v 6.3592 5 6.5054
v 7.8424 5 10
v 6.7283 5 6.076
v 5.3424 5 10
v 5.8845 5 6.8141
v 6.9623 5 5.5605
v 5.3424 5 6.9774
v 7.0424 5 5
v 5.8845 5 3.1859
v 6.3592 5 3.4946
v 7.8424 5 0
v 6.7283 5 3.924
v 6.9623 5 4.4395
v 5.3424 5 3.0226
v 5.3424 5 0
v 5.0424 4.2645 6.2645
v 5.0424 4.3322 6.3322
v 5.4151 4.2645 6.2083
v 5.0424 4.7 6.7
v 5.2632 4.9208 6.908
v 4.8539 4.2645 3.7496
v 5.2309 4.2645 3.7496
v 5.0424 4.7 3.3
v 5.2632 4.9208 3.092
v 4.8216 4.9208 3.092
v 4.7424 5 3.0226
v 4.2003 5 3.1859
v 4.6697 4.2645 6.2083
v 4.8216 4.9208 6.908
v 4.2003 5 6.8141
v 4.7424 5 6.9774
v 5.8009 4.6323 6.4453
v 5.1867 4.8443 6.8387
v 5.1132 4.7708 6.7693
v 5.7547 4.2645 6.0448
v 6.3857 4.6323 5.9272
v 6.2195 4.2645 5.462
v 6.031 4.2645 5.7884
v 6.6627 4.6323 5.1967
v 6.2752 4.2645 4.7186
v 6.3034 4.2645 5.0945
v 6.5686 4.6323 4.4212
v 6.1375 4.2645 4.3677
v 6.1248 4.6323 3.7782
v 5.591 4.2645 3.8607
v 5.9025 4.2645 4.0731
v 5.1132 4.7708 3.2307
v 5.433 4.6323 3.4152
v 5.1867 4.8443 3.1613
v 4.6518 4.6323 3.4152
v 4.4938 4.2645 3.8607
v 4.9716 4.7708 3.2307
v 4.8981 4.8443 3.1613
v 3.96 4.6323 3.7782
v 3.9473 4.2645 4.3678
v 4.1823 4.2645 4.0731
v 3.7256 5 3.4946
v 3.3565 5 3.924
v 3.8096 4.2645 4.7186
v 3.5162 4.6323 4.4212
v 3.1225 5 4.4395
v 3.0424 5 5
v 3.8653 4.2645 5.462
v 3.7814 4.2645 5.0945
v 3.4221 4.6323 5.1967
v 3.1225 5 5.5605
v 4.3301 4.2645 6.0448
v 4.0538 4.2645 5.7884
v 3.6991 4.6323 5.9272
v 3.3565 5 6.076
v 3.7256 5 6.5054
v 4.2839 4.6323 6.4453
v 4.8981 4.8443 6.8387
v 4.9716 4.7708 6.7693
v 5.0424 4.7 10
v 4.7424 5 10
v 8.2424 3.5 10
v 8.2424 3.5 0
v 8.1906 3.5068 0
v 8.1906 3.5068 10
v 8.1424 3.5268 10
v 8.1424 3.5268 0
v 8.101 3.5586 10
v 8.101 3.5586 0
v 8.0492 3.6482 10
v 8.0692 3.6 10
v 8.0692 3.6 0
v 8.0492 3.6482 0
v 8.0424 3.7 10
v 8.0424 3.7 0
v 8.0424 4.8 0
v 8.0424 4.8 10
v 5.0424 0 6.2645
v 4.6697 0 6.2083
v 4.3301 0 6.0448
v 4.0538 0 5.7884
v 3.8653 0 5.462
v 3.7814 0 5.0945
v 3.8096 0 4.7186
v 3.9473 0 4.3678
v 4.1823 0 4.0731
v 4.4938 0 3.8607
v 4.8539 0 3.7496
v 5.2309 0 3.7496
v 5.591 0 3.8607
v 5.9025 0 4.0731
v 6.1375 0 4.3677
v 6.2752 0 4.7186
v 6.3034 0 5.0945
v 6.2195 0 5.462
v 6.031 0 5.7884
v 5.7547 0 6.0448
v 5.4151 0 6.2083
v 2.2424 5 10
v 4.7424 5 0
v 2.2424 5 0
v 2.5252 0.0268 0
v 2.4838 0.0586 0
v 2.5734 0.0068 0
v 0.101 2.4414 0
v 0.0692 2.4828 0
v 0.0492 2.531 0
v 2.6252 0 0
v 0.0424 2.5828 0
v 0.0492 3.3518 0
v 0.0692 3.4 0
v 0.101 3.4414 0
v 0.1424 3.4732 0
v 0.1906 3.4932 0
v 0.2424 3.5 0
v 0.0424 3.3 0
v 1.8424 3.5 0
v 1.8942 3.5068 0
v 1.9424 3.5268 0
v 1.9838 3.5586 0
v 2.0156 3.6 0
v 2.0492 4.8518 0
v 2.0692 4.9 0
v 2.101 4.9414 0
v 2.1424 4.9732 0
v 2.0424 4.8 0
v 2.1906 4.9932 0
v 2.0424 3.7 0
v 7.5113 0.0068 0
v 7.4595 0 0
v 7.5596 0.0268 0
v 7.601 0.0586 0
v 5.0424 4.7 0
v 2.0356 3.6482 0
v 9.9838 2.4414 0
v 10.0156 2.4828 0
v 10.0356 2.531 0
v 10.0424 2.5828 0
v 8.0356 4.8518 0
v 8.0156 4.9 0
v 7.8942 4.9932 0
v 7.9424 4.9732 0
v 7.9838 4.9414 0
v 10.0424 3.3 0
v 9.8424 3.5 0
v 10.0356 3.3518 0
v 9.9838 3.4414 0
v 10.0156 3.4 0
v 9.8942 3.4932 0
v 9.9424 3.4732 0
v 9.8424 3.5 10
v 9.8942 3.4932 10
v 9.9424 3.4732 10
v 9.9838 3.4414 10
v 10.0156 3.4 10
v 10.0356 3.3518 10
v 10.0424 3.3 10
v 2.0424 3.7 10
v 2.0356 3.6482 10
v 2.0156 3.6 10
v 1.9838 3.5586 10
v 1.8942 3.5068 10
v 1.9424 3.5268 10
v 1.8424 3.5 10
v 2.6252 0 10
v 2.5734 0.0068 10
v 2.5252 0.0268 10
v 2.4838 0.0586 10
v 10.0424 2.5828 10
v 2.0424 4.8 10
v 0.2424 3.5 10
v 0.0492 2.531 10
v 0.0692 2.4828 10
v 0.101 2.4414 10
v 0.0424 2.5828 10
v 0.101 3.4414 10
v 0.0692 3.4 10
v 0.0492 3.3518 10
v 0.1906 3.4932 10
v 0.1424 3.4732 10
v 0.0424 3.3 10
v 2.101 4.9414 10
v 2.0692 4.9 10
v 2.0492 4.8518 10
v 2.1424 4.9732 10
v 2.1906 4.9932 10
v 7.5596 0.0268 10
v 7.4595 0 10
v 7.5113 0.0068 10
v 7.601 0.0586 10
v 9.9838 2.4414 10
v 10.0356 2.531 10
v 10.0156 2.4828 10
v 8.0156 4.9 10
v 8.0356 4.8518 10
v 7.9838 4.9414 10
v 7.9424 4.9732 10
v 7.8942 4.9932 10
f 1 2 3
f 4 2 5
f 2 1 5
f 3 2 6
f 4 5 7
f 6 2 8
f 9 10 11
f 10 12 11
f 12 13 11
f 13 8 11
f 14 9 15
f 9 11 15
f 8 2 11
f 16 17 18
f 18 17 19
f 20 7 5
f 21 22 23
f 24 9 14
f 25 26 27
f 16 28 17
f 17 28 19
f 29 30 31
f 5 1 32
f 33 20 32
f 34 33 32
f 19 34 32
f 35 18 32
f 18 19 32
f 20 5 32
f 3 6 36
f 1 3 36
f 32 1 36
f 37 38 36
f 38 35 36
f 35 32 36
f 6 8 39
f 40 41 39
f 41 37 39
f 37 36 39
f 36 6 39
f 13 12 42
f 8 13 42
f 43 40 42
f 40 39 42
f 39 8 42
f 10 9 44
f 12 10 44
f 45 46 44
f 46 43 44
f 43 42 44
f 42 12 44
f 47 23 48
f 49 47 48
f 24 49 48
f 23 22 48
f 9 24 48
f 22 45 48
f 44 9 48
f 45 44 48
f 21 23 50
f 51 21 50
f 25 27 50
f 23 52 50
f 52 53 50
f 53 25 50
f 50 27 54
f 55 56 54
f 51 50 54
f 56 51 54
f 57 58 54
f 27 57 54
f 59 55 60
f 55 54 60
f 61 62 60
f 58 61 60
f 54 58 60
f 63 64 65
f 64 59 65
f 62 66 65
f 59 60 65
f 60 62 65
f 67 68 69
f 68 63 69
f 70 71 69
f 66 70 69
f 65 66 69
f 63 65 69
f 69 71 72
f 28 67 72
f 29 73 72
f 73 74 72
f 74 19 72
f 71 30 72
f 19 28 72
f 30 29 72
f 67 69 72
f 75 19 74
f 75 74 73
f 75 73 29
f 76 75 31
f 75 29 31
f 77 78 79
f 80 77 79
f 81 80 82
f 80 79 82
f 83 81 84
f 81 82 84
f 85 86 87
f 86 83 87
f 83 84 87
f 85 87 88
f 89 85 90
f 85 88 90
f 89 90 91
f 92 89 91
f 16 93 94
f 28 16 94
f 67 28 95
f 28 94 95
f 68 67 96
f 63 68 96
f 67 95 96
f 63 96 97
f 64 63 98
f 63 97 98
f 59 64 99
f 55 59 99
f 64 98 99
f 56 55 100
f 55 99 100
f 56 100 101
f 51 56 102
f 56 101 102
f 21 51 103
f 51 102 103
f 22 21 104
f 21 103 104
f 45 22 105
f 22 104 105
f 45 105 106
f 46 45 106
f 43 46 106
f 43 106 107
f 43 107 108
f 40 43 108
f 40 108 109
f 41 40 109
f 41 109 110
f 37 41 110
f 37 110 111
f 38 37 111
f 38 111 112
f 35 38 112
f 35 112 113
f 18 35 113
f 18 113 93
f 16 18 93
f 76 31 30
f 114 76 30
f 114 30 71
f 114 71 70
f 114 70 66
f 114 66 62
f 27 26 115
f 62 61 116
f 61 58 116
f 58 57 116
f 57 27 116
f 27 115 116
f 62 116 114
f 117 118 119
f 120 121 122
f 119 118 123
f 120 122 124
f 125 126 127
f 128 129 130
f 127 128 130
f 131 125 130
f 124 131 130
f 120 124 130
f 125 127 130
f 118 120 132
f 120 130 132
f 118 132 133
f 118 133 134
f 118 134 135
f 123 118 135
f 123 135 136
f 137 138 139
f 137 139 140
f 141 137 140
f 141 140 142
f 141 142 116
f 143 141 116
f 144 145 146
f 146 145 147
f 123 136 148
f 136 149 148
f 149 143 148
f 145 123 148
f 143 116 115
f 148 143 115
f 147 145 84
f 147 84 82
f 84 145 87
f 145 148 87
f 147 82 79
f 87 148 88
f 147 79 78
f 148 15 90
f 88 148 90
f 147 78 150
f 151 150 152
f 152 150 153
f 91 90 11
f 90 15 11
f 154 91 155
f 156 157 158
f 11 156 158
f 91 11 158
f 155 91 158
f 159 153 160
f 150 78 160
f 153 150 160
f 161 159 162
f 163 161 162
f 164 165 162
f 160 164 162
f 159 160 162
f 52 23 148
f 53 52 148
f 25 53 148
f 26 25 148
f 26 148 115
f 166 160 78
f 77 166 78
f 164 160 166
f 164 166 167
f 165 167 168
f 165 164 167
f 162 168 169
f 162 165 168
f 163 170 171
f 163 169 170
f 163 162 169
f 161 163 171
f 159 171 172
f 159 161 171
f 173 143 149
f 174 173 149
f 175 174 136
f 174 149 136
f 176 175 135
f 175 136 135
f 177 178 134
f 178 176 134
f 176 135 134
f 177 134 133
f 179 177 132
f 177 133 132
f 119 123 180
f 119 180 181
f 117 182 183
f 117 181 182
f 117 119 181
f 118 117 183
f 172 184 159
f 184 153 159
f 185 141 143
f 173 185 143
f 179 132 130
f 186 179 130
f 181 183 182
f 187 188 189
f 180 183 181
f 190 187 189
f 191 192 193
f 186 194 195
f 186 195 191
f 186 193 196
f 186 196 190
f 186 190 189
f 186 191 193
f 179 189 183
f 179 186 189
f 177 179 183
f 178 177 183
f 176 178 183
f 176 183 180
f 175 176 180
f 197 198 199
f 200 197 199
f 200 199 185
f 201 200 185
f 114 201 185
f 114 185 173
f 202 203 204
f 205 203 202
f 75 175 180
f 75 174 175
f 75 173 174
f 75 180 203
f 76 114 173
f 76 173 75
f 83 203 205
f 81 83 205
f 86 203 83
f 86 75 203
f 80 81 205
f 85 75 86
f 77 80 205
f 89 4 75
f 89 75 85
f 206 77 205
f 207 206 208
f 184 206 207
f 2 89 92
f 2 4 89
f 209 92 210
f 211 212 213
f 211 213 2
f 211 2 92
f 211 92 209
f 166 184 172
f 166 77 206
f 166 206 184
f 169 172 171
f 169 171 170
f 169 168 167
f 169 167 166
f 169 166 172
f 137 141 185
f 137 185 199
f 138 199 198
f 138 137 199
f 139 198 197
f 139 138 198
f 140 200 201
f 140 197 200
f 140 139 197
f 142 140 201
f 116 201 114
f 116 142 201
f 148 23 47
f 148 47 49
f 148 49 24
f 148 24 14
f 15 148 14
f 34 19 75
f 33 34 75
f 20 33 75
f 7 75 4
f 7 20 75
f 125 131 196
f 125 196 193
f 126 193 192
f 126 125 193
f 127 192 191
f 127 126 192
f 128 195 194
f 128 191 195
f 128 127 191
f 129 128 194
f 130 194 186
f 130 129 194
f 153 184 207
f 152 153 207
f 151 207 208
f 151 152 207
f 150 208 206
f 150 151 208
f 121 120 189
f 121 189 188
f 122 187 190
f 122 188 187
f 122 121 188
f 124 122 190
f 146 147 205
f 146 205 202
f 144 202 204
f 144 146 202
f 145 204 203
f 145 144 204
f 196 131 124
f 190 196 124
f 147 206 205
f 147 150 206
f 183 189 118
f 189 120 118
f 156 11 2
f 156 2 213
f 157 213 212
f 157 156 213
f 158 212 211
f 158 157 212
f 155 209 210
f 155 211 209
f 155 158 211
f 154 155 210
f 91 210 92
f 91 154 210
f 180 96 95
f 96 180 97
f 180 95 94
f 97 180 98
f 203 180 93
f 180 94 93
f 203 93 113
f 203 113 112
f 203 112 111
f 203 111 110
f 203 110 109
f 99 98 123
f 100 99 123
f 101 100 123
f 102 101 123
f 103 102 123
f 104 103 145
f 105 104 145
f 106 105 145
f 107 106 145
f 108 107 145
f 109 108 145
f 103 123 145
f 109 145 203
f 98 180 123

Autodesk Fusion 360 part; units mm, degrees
sketch "Sketch1" plane through (0, 0, 0) normal (0, 0, 1) x (1, 0, 0)
  line L0 (2.6252, 0) -> (7.4595, 0)
  line L1 (10.0424, 2.5828) -> (10.0424, 3.3)
  line L2 (0.0424, 3.3) -> (0.0424, 2.5828)
  line L3 (8.0424, 3.7) -> (8.0424, 4.8)
  line L4 (2.0424, 4.8) -> (2.0424, 3.7)
  line L5 (0.101, 2.4414) -> (2.4838, 0.0586)
  line L6 (0.0424, 2.5) -> (3.5052, 2.5) construction
  line L7 (5.0424, 3.5) -> (5.0424, 0) construction
  line L8 (9.9838, 2.4414) -> (7.601, 0.0586)
  line L9 (9.8424, 3.5) -> (8.2424, 3.5)
  line L10 (1.8424, 3.5) -> (0.2424, 3.5)
  line L11 (5.0424, 4.7) -> (5.3424, 5)
  line L12 (5.0424, 4.7) -> (6.213, 4.7) construction
  line L13 (5.0424, 4.7) -> (4.7424, 5)
  line L14 (5.0424, 4.7) -> (6.2088, 4.7) construction
  line L15 (7.8424, 5) -> (5.3424, 5)
  line L16 (4.7424, 5) -> (2.2424, 5)
  arc A0 (0.2424, 3.5) -> (0.0424, 3.3) centre (0.2424, 3.3) ccw
  arc A1 (0.0424, 2.5828) -> (0.101, 2.4414) centre (0.2424, 2.5828) ccw
  arc A2 (2.4838, 0.0586) -> (2.6252, 0) centre (2.6252, 0.2) ccw
  arc A3 (7.4595, 0) -> (7.601, 0.0586) centre (7.4595, 0.2) ccw
  arc A4 (9.9838, 2.4414) -> (10.0424, 2.5828) centre (9.8424, 2.5828) ccw
  arc A5 (10.0424, 3.3) -> (9.8424, 3.5) centre (9.8424, 3.3) ccw
  arc A6 (8.0424, 3.7) -> (8.2424, 3.5) centre (8.2424, 3.7) ccw
  arc A7 (8.0424, 4.8) -> (7.8424, 5) centre (7.8424, 4.8) ccw
  arc A8 (2.2424, 5) -> (2.0424, 4.8) centre (2.2424, 4.8) ccw
  arc A9 (1.8424, 3.5) -> (2.0424, 3.7) centre (1.8424, 3.7) ccw
  dimension "d1" = 10
  dimension "d4" = 5
  dimension "d5" = 45
  dimension "d6" = 1
  dimension "d7" = 5
  dimension "d8" = 6
  dimension "d9" = 2
  dimension "d10" = 2
  dimension "d12" = 45
  dimension "d13" = 0.3
  dimension "d14" = 5
  dimension "d15" = 1.5
  dimension "d16" = 0.2
extrude "Extrude1" add sketch "Sketch1" along normal blind 10
hole "Hole1" at (5.0424, 5, 5) direction (0, -1, 0) diameter 2.529 depth 5.834 tip angle 180 countersink diameter 4 countersink angle 90
